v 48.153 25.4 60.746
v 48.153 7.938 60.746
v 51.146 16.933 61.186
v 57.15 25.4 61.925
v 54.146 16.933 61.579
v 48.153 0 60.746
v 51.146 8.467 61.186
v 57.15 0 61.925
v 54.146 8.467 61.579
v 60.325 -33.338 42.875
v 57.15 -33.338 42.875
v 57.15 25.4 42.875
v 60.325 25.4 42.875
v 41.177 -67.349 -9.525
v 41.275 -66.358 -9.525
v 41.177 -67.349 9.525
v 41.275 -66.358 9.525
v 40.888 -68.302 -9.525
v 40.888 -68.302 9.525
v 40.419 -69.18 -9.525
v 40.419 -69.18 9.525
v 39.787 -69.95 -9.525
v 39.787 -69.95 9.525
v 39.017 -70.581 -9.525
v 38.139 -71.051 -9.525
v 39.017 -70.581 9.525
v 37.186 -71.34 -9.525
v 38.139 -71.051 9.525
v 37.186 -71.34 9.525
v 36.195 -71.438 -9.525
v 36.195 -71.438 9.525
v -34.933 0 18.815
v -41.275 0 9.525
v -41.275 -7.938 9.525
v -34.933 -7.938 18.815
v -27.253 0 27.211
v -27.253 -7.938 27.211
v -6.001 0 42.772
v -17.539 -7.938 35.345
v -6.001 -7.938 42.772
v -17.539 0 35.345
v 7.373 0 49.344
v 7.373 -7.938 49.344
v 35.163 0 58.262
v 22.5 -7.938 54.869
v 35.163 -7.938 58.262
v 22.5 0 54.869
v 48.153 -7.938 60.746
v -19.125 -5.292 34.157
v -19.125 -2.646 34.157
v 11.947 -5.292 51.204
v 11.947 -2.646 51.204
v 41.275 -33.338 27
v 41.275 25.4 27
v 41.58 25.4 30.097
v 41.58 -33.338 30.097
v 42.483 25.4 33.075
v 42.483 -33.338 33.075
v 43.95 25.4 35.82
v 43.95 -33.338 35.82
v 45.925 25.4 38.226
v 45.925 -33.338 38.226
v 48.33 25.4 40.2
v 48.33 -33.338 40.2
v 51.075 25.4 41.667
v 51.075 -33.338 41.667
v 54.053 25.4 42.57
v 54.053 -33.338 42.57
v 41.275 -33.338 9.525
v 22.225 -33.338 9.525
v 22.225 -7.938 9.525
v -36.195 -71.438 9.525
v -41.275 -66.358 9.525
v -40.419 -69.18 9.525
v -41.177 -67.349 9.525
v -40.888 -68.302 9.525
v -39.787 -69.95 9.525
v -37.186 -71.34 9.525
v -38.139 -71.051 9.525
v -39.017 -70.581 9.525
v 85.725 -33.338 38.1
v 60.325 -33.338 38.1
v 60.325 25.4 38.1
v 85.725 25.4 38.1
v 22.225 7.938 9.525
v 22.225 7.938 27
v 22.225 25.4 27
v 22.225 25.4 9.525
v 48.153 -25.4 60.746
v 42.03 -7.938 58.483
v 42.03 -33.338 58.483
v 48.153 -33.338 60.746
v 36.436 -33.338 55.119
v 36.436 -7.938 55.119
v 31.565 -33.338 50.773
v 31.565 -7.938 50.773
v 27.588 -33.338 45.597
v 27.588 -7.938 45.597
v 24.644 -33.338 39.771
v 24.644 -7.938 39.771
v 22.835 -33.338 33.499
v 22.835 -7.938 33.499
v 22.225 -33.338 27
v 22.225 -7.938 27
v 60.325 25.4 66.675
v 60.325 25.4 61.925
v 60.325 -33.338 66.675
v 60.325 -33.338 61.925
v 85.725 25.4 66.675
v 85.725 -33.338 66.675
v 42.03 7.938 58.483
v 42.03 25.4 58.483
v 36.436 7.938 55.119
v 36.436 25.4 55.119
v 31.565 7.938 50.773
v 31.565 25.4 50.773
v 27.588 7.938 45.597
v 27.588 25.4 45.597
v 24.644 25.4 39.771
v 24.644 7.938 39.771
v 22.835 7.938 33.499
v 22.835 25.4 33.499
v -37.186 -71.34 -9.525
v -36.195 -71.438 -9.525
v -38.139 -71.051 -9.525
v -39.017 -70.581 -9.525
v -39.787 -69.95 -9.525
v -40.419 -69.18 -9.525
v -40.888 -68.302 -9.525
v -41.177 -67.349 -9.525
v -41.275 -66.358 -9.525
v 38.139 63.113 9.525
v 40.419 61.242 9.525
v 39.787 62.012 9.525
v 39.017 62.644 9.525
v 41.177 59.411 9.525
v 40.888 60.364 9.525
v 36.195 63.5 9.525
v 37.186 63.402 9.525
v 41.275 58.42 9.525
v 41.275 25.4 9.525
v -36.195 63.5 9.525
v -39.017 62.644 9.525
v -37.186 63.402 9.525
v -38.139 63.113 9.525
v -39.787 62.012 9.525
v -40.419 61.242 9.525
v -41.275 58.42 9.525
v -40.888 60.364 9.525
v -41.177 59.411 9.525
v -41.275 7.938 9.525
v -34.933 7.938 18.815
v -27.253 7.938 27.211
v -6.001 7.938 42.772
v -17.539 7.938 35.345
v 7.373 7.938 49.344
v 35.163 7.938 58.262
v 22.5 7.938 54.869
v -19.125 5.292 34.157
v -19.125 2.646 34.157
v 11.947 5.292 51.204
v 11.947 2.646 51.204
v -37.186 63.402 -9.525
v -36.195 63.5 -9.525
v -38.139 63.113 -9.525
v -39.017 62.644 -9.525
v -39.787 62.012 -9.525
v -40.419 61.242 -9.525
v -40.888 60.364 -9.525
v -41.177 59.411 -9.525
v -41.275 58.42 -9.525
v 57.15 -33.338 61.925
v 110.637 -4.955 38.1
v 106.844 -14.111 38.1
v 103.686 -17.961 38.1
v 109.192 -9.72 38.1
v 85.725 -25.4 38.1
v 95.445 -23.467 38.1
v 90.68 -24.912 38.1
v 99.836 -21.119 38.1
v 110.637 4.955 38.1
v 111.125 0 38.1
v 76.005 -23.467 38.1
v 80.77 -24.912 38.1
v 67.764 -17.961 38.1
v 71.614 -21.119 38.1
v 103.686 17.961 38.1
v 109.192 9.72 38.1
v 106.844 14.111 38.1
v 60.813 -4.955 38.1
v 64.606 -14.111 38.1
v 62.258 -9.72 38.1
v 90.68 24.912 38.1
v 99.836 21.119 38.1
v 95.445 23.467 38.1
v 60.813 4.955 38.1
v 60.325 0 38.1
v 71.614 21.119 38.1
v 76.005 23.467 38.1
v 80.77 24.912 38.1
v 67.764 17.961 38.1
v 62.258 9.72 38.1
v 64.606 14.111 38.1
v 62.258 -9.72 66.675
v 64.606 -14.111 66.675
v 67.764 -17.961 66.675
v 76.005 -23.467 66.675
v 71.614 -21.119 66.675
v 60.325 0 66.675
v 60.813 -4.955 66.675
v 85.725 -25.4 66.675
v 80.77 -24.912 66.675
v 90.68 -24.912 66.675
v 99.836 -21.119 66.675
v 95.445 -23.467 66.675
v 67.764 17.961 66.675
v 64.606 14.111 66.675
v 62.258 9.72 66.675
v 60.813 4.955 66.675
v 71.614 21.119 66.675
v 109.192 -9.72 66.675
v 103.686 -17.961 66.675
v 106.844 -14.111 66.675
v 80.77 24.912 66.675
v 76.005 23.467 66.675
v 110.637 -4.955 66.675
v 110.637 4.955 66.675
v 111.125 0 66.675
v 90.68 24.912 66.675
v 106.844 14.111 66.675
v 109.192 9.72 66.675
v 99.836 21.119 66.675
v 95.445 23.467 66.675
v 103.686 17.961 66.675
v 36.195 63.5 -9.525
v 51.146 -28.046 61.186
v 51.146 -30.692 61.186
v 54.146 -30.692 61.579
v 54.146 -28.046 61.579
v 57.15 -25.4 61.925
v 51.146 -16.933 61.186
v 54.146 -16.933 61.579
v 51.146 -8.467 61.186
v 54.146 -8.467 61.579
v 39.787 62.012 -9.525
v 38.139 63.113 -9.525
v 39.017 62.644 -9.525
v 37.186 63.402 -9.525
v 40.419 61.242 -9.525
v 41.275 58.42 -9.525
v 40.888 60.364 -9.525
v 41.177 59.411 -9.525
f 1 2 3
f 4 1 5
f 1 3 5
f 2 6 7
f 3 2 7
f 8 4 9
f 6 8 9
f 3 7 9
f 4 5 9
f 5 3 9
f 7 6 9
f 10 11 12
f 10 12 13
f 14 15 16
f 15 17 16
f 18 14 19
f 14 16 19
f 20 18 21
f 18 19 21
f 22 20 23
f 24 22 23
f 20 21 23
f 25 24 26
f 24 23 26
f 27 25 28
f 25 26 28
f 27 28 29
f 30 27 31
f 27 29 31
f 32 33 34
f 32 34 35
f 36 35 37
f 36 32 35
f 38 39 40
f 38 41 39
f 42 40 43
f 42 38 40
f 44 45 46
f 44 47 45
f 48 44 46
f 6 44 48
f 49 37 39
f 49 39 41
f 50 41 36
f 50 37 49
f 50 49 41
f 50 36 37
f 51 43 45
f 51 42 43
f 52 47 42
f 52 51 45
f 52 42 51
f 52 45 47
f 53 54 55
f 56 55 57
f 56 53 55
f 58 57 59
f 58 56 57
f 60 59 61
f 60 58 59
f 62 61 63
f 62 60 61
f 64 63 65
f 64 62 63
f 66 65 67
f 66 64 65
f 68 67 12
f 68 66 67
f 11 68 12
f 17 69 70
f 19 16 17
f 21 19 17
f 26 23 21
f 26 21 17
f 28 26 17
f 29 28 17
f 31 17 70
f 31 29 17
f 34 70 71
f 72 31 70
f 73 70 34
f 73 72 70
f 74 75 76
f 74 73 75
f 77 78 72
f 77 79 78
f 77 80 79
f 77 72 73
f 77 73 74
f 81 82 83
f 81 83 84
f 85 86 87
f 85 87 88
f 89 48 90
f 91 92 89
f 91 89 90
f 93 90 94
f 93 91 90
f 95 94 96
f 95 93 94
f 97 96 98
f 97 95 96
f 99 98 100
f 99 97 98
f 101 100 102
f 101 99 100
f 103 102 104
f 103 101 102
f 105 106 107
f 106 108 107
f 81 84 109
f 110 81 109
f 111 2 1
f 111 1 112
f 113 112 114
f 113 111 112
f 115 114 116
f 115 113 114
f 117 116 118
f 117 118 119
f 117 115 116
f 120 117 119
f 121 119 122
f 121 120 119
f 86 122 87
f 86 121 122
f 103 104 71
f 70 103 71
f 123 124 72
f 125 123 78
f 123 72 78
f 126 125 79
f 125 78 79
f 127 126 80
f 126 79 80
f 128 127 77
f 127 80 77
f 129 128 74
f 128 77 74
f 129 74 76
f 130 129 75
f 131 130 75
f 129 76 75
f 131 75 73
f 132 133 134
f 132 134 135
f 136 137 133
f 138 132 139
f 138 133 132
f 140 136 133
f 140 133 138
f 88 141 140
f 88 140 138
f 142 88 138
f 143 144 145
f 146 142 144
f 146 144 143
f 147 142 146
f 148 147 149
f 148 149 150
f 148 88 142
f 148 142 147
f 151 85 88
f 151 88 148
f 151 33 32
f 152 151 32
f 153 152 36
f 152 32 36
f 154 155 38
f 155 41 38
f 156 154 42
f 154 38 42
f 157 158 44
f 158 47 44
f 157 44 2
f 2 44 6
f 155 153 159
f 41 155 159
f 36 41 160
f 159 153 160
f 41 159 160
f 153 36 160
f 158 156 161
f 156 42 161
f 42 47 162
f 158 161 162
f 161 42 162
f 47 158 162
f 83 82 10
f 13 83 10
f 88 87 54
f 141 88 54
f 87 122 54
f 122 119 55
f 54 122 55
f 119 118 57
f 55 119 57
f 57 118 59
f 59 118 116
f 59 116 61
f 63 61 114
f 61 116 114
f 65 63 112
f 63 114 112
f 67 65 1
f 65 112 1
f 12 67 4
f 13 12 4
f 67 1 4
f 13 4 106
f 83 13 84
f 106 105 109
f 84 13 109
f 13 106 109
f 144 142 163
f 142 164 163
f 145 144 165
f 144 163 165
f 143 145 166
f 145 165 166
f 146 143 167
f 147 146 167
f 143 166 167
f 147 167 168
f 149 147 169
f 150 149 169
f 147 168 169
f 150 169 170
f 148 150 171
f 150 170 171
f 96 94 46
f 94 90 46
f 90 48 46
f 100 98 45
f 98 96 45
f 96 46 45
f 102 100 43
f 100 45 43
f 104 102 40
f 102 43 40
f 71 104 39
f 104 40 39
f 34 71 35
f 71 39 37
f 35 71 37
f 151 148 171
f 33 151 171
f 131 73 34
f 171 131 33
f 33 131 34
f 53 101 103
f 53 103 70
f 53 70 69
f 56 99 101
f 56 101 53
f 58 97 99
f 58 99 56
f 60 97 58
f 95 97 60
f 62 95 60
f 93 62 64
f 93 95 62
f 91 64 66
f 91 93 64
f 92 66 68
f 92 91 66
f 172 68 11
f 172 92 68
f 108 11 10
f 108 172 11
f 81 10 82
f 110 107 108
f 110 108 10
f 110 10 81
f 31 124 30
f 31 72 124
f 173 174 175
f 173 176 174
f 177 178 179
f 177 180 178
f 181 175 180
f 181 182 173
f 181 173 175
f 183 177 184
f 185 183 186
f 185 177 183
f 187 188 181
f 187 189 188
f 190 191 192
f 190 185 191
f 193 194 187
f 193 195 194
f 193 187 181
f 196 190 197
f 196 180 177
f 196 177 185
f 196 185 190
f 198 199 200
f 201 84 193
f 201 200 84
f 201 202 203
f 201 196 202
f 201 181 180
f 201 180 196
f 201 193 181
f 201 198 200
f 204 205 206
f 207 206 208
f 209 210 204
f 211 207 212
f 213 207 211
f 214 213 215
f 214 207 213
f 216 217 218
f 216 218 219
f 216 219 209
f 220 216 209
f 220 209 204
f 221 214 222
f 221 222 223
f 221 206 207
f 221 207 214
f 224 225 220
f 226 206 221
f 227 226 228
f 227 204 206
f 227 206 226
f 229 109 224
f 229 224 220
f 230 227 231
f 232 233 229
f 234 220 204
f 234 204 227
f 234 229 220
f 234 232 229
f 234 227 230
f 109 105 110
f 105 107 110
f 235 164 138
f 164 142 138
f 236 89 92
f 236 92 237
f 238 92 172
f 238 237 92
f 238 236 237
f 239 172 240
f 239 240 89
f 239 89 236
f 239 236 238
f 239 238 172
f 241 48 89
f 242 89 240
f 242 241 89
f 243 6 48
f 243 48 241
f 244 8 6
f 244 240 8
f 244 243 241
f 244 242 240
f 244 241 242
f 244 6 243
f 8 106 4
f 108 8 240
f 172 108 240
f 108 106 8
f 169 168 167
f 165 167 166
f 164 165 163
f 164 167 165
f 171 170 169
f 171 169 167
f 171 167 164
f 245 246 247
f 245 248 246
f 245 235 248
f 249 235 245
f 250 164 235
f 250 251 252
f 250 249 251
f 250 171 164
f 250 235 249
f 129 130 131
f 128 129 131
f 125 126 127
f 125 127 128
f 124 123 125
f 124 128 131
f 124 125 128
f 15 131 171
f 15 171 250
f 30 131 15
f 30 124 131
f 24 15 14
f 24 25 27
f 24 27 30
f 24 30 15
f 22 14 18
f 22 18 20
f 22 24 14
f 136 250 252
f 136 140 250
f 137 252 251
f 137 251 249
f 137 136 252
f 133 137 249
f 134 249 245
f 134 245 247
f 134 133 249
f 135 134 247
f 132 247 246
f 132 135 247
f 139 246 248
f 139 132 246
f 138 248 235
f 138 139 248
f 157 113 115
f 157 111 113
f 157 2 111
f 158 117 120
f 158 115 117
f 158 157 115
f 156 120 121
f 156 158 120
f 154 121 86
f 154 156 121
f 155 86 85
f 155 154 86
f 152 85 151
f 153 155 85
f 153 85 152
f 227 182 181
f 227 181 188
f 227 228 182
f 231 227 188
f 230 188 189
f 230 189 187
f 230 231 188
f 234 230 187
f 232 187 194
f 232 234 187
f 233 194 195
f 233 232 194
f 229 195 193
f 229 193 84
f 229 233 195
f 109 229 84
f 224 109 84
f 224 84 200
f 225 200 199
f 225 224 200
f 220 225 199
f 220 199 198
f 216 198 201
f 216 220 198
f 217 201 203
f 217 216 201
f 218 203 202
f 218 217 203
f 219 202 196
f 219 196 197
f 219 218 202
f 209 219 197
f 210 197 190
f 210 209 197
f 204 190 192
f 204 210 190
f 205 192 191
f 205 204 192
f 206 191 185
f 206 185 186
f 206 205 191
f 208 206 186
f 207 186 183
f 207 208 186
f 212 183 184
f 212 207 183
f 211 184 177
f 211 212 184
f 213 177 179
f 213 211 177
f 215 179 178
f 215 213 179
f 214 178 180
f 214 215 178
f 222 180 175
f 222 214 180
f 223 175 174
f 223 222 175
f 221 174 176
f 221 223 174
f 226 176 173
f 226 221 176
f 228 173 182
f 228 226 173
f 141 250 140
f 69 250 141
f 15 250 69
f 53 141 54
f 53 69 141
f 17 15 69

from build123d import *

# Parameters (mm, degrees)
F1_DEPTH  = 63.5
F0_W      = 25.4
F0_H      = 4.7752
F0_H_2    = 19.05
F0_H_3    = 4.7498
F2_DEPTH  = 25.4
F1_FACE_W = 82.55
F1_FACE_H = 19.05
F3_DEPTH  = 7.9375
F5_R      = 5.08


with BuildPart() as f1:
    # F0 (on Front) → F1 (new body, symmetric)
    with BuildSketch(Plane.XZ):
        Polygon((22.225, 9.525), (-41.275, 9.525), (-41.275, -9.525), (41.275, -9.525), (41.275, 9.525), align=None)
    extrude(amount=F1_DEPTH, both=True)



with BuildPart() as f2:
    # F0 (on Front) → F2 (new body, symmetric)
    with BuildSketch(Plane.XZ):
        with BuildLine():
            Line((22.225, 27.0002), (22.225, 9.525))
            Line((22.225, 9.525), (41.275, 9.525))
            Line((41.275, 9.525), (41.275, 27.0002))
            ThreePointArc((41.275, 27.0002), (45.9246798487, 38.2255201513), (57.15, 42.8752))
            Line((57.15, 42.8752), (60.325, 42.8752))
            Line((60.325, 42.8752), (60.325, 61.9252))
            Line((60.325, 61.9252), (57.15, 61.9252))
            add(Edge.make_bspline(
                [(48.1528064191, 60.7464017517), (51.1419186041, 61.209984551), (54.1438579917, 61.6028562515), (57.15, 61.9252)],
                knots=[103.2748803526, 103.2748803526, 103.2748803526, 103.2748803526, 111.5045361635, 111.5045361635, 111.5045361635, 111.5045361635], degree=3))
            ThreePointArc((48.1528064191, 60.7464017517), (29.455392124, 48.2784593178), (22.225, 27.0002))
        make_face()
        with Locations((73.025, 40.4876)):
            Rectangle(F0_W, F0_H)
        with Locations((73.025, 52.4002)):
            Rectangle(F0_W, F0_H_2)
        with Locations((73.025, 64.3001)):
            Rectangle(F0_W, F0_H_3)
    extrude(amount=F2_DEPTH, both=True)


with BuildPart() as f1_1:
    add(f1.part)

    add(f2.part)  # F3 merges F2
    # F1_face (on face) + F2_face (on face) + F0 (on Front) → F3 (join, symmetric)
    with BuildSketch(Plane.XZ.offset(63.5)):
        Rectangle(F1_FACE_W, F1_FACE_H)
    with BuildSketch(Plane(origin=(51.9857603238, -25.4, 42.9069898017), x_dir=(1, 0, 0), z_dir=(0, -1, 0))):
        with BuildLine():
            ThreePointArc((-3.8329539047, 17.83941195), (-22.5303681998, 5.371469516), (-29.7607603238, -15.9067898017))
            Line((-29.7607603238, -15.9067898017), (-29.7607603238, -33.3819898017))
            Line((-29.7607603238, -33.3819898017), (-10.7107603238, -33.3819898017))
            Line((-10.7107603238, -33.3819898017), (-10.7107603238, -15.9067898017))
            ThreePointArc((-10.7107603238, -15.9067898017), (-6.0610804752, -4.6814696504), (5.1642396762, -0.0317898017))
            Line((5.1642396762, -0.0317898017), (8.3392396762, -0.0317898017))
            Line((8.3392396762, -0.0317898017), (8.3392396762, -4.8069898017))
            Line((8.3392396762, -4.8069898017), (33.7392396762, -4.8069898017))
            Line((33.7392396762, -4.8069898017), (33.7392396762, 23.7680101983))
            Line((33.7392396762, 23.7680101983), (8.3392396762, 23.7680101983))
            Line((8.3392396762, 23.7680101983), (8.3392396762, 19.0182101983))
            Line((8.3392396762, 19.0182101983), (5.1642396762, 19.0182101983))
            add(Edge.make_bspline(
                [(-3.8329539047, 17.83941195), (-0.8438417197, 18.3029947493), (2.1580976679, 18.6958664498), (5.1642396762, 19.0182101983)],
                knots=[103.2748803526, 103.2748803526, 103.2748803526, 103.2748803526, 111.5045361635, 111.5045361635, 111.5045361635, 111.5045361635], degree=3))
        make_face()
    with BuildSketch(Plane.XZ):
        with BuildLine():
            add(Edge.make_bspline(
                [(-41.275, 9.525), (-24.8485755783, 37.9756954043), (10.6420999739, 54.9288488393), (48.1528064191, 60.7464017517)],
                knots=[0, 0, 0, 0, 103.2748803526, 103.2748803526, 103.2748803526, 103.2748803526], degree=3))
            Line((-41.275, 9.525), (22.225, 9.525))
            Line((22.225, 9.525), (22.225, 27.0002))
            ThreePointArc((22.225, 27.0002), (29.455392124, 48.2784593178), (48.1528064191, 60.7464017517))
        make_face()
    extrude(amount=F3_DEPTH, both=True)

    # F5
    f5_edges = [f1_1.edges().sort_by_distance(p)[0] for p in [
        (-41.275, -71.4375, 0),
        (41.275, -71.4375, 0),
        (41.275, 63.5, 0),
        (-41.275, 63.5, 0),
    ]]
    fillet(f5_edges, radius=F5_R)


with BuildPart() as f4:
    # F0 (on Front) → F4 (revolve)
    with BuildSketch(Plane.XZ):
        Polygon((85.725, 66.675), (85.725, 61.9252), (85.725, 42.8752), (85.725, 38.1), (111.125, 38.1), (111.125, 66.675), align=None)
    revolve(axis=Axis((85.725, 0, 52.3875), (0, 0, 1)))


solid = Compound([f1_1.part, f4.part])
